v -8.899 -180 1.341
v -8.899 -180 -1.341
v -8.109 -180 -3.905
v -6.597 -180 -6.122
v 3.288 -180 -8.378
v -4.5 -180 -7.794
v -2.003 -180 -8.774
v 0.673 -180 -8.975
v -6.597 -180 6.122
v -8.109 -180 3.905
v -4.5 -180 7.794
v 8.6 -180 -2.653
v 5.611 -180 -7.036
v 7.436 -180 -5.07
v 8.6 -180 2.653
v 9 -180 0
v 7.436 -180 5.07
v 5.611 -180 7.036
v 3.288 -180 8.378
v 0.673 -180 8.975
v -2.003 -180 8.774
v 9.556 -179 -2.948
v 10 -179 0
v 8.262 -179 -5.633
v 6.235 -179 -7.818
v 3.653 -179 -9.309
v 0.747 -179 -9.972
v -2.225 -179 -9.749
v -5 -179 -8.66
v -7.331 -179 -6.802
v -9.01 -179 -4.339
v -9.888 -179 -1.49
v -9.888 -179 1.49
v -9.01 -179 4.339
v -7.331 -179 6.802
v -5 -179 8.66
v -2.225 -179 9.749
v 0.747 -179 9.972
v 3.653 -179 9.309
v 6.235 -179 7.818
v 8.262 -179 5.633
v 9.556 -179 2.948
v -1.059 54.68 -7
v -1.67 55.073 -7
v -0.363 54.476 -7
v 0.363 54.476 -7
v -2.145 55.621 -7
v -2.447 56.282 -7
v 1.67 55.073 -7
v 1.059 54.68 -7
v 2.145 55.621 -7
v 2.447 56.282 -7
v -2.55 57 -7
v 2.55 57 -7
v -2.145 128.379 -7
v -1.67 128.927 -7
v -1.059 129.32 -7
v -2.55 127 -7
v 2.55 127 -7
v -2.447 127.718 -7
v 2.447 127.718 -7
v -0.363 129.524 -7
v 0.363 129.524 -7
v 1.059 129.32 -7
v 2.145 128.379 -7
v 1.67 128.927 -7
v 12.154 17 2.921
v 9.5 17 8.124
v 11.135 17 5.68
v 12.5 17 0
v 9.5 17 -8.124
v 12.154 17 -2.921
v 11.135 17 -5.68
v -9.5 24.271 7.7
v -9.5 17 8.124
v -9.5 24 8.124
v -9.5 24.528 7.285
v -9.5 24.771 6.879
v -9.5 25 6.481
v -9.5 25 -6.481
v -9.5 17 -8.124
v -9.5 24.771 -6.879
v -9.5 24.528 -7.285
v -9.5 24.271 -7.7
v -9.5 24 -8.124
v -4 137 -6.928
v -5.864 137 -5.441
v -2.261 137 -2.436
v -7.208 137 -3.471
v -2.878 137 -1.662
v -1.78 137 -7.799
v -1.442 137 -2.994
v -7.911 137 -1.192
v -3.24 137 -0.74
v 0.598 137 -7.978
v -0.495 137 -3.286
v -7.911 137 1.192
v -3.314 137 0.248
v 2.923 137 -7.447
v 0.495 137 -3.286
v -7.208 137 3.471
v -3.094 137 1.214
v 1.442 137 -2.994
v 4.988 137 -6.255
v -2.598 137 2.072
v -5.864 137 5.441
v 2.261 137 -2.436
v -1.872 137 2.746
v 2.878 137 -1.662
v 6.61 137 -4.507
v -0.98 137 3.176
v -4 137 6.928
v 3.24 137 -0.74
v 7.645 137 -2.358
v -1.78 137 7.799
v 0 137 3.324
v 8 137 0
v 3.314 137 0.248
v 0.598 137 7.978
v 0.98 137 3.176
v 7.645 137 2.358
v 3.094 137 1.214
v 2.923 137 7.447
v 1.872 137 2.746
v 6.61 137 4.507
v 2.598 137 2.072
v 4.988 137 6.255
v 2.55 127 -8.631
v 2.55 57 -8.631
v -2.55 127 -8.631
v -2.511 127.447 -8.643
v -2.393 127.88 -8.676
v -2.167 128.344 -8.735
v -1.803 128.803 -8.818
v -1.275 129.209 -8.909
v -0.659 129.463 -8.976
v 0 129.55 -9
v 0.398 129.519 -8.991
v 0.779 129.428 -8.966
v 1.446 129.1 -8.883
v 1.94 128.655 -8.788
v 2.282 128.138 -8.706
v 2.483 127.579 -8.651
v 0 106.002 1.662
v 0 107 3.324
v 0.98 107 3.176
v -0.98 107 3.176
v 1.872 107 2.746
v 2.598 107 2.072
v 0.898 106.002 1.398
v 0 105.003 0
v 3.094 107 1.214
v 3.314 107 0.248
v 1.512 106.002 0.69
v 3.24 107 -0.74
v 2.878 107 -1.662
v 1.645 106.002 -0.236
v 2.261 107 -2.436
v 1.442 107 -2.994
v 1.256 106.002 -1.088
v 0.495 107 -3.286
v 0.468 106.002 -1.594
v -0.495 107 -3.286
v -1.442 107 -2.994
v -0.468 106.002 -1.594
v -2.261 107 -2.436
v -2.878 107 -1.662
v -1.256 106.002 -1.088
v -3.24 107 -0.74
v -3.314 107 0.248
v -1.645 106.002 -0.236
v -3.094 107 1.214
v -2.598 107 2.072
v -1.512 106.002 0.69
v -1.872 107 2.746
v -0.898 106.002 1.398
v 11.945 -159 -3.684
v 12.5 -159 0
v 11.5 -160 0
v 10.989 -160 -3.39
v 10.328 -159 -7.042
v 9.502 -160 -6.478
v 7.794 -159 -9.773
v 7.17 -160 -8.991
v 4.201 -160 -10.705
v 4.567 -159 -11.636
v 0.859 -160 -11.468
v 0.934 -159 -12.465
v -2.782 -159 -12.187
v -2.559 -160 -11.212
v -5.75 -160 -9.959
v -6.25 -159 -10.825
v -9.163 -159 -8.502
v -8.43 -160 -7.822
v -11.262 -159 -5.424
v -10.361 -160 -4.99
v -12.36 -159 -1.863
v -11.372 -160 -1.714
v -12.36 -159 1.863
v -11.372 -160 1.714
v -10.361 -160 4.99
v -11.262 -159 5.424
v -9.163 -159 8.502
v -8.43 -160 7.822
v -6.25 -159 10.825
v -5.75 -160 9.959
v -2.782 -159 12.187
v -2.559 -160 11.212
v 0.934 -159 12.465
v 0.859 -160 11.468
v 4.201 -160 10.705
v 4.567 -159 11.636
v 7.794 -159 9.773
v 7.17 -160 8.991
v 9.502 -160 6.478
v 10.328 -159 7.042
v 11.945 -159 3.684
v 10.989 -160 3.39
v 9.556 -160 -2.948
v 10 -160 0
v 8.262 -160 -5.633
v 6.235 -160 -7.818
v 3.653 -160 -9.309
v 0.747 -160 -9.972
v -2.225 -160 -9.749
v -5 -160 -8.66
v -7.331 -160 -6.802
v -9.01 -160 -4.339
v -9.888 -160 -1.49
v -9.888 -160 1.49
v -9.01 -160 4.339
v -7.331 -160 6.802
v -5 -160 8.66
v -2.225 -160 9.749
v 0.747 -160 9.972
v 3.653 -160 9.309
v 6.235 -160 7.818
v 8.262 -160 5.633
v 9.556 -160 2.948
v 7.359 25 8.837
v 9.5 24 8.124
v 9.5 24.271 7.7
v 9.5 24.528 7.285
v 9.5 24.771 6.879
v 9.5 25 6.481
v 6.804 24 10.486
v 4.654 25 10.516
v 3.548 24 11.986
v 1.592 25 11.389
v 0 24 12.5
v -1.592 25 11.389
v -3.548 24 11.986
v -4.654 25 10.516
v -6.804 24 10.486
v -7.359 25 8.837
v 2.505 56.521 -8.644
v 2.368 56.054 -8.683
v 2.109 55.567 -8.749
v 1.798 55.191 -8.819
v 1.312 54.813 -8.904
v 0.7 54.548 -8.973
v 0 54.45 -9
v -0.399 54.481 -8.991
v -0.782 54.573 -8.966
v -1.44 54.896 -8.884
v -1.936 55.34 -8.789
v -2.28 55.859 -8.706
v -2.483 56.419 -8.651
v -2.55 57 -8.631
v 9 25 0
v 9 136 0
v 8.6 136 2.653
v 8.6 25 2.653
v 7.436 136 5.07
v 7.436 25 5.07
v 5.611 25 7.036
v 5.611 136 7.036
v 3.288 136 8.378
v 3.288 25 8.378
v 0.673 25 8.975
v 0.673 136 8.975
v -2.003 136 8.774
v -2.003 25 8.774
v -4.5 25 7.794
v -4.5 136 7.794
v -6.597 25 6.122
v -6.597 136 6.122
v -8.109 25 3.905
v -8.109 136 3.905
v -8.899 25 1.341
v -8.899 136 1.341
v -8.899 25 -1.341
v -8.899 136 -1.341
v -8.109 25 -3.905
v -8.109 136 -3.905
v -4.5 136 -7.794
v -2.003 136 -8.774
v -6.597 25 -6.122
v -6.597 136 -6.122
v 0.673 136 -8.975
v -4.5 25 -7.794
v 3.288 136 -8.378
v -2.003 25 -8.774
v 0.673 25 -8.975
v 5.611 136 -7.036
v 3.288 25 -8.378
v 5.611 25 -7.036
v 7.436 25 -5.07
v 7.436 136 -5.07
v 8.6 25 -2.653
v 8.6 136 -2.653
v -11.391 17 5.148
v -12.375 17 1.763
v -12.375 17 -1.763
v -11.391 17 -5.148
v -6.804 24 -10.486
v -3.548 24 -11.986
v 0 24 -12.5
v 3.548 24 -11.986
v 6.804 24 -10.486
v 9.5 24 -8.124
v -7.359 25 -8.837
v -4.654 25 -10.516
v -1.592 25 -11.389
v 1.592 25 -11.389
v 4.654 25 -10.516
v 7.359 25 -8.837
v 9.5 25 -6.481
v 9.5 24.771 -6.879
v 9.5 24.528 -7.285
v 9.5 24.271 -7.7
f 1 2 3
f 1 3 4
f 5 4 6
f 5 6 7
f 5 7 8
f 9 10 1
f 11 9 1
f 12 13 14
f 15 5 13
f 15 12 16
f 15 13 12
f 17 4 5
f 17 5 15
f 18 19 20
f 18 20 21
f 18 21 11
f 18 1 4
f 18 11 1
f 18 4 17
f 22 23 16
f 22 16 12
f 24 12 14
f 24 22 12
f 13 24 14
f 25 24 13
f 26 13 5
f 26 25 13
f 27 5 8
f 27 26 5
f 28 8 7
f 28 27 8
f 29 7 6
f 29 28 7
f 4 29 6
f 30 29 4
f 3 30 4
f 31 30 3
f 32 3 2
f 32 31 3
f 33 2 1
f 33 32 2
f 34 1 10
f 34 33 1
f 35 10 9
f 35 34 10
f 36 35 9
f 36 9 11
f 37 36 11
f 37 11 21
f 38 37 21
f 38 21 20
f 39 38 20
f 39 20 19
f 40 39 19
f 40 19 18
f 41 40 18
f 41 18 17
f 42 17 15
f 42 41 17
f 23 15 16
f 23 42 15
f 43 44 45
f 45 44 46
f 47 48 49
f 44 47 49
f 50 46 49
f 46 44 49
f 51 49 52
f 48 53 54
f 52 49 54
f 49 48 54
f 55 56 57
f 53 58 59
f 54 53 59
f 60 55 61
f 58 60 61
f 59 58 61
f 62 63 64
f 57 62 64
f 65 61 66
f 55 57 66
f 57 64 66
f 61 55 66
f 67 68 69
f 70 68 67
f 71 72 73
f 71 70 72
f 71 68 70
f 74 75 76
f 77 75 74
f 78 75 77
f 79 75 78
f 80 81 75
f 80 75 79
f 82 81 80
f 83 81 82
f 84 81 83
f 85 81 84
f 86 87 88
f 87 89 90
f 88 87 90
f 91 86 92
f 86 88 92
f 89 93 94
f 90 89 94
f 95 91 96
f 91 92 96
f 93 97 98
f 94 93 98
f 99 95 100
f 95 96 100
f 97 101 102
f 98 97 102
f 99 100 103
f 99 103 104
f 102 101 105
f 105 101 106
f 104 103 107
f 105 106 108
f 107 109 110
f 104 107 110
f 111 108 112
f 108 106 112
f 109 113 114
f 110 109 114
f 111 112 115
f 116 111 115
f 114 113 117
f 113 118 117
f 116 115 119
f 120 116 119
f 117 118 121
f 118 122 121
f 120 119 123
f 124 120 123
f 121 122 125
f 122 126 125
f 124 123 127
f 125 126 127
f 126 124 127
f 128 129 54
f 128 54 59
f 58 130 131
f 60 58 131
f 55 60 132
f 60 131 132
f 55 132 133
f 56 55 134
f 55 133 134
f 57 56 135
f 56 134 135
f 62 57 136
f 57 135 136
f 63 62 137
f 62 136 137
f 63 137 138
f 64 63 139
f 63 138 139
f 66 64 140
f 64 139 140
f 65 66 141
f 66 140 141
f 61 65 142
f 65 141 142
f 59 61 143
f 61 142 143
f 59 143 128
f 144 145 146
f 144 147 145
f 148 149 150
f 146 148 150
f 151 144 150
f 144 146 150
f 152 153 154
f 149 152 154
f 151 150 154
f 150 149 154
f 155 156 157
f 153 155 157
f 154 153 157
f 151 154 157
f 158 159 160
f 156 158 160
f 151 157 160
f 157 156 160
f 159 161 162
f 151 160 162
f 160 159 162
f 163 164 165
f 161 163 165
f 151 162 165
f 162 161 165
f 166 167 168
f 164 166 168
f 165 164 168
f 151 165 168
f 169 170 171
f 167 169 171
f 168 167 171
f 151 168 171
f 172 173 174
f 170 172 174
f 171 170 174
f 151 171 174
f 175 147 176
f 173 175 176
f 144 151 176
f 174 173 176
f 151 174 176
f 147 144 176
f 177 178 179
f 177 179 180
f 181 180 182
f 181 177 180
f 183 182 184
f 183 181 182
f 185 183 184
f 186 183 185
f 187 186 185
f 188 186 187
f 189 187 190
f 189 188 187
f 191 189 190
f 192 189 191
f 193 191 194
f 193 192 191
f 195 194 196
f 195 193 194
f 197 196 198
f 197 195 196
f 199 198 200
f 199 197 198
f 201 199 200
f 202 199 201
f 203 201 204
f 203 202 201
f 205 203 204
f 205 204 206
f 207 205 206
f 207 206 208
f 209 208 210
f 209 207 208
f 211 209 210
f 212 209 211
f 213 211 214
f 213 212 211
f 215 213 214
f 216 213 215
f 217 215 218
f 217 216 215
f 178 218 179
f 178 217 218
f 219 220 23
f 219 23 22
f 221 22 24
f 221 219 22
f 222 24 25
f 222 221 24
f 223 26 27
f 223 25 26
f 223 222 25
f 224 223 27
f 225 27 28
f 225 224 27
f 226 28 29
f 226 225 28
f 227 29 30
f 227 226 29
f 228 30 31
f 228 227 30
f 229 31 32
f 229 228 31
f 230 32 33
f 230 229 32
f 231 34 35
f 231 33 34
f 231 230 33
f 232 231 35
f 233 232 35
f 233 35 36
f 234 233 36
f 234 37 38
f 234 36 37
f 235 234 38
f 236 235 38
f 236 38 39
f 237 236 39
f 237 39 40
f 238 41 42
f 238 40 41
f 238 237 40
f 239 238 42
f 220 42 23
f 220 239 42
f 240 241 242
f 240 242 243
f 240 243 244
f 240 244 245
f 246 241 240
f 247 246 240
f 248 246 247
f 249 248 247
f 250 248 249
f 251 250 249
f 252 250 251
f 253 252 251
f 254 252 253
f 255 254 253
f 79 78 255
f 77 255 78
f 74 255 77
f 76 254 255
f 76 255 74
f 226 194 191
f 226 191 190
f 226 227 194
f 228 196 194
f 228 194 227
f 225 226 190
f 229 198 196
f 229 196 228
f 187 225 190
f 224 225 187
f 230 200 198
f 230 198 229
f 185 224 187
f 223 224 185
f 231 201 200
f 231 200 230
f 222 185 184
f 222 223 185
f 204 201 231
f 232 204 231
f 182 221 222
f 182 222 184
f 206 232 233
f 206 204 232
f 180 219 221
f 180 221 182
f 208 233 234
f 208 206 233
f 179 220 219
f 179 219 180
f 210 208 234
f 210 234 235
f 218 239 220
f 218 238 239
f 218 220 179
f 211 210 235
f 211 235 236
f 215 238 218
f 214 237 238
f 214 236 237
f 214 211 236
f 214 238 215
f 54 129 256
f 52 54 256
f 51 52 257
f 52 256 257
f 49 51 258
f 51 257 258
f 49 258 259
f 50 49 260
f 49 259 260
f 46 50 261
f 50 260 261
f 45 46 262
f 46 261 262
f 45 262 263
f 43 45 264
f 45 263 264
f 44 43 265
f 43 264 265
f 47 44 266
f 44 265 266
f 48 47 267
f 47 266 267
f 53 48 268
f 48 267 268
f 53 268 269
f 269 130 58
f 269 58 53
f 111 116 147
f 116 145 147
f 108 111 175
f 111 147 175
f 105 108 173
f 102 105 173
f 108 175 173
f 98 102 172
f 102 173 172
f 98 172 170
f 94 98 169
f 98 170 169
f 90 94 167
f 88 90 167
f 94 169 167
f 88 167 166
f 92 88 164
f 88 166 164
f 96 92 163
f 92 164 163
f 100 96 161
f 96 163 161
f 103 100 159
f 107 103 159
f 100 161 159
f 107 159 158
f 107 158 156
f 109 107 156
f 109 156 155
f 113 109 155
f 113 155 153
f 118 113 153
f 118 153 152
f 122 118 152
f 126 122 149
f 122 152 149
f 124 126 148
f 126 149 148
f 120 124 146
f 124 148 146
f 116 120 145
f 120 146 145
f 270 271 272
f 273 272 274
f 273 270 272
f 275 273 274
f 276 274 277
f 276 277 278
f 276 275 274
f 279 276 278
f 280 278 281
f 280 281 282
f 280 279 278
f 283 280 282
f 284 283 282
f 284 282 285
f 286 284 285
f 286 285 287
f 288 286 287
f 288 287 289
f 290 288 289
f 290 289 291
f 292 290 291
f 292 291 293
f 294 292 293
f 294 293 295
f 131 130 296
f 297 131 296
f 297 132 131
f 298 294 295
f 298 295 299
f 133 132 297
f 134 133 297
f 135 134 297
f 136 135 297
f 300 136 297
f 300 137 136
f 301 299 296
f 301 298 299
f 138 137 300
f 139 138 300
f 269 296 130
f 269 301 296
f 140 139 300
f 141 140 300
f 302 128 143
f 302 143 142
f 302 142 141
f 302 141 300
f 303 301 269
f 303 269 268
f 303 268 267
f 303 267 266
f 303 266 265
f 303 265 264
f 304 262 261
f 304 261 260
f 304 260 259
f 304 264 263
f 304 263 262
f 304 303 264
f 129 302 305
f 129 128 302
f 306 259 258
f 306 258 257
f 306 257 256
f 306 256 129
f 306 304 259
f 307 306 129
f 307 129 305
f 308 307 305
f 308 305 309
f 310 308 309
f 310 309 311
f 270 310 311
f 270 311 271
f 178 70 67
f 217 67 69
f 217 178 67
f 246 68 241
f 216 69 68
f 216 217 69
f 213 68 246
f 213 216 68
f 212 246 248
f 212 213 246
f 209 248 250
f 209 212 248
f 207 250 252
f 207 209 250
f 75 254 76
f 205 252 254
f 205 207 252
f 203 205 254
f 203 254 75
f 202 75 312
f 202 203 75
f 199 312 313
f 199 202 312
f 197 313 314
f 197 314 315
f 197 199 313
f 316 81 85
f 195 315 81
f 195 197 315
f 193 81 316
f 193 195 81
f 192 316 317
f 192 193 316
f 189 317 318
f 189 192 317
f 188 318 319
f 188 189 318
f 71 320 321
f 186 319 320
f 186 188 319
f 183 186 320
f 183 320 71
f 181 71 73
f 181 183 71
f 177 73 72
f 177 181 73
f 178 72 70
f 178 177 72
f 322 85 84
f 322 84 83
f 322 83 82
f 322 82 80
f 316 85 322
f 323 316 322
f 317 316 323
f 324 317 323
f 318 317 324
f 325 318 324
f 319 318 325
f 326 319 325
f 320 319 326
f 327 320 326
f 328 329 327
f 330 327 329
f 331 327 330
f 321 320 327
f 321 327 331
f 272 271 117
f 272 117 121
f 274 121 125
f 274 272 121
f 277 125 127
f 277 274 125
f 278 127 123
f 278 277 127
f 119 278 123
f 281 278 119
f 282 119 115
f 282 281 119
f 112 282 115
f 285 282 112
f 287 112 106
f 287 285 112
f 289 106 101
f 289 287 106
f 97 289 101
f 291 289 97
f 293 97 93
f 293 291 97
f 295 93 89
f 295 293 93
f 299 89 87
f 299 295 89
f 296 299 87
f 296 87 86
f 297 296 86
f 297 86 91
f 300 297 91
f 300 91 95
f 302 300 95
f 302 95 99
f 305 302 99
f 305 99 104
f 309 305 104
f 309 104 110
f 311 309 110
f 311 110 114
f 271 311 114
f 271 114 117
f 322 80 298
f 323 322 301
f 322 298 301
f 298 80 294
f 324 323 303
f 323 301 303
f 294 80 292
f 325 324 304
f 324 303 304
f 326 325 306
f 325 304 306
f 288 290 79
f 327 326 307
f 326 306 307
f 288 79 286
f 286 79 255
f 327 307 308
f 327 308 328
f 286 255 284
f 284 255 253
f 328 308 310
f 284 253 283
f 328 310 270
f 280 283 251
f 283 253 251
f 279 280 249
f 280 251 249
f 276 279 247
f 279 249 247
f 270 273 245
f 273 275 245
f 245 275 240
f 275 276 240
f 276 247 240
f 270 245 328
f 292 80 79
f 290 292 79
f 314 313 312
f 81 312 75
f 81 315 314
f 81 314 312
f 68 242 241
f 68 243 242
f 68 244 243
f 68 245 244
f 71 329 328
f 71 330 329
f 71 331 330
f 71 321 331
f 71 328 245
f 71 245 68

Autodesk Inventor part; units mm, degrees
ref_plane "YZ Plane" through (0, 0, 0) normal (1, 0, 0) x (0, 1, 0)
ref_plane "XZ Plane" through (0, 0, 0) normal (0, 1, 0) x (-1, 0, 0)
sketch "Эскиз1" plane through (0, 0, 0) normal (0, 0, 1) x (1, 0, 0)
  line L0 (0, 137) -> (0, -200)
  line L1 (0, 137) -> (9, 137)
  line L2 (9, 137) -> (9, 25)
  line L3 (9, 25) -> (12.5, 25)
  line L4 (12.5, 25) -> (12.5, -180)
  line L5 (12.5, -180) -> (0, -180)
  line L6 (10, -180) -> (10, -160)
  line L7 (10, -160) -> (12.5, -160)
  point P0 (0, 0)
  point P1 (0, -177.0364)
  dimension "d1" = 200
  dimension "d2" = 18
  dimension "d3" = 25
  dimension "d7" = 25
  dimension "d8" = 137
  dimension "d16" = 180
  dimension "d17" = 20
  dimension "d18" = 20
revolve "Вращение1" add sketch "Эскиз1" angle 360 about axis through (0, 137, 0) along (0, -1, 0) contours L1 L2 L3 L4 L7 L6 L5 L0
sketch "Эскиз2" plane through (0, 137, 0) normal (0, 1, 0) x (1, 0, 0)
  point P0 (0, 0)
hole "Отверстие1" at (0, 137, 0) direction (0, -1, 0) diameter 6.647 depth 30 tip angle 118 thread size "M8x1.25" class "6H" standard "ISO Metric profile"
thread "Резьба1" size "M20x2.5" class "6g" standard "ISO Metric profile" full length
ref_plane "РабПлоскость1" through (0, 81, -9) normal (0, 0, 1) x (1, 0, 0)
sketch "Эскиз3" plane through (0, 81, -9) normal (0, 0, 1) x (1, 0, 0)
  line L0 (0, 46) -> (0, -24) construction
  line L1 (-2.55, 46) -> (-2.55, -24)
  line L2 (2.55, -24) -> (2.55, 46)
  arc A0 (2.55, 46) -> (-2.55, 46) centre (0, 46) ccw
  arc A1 (-2.55, -24) -> (2.55, -24) centre (0, -24) ccw
  line L3 (-9, 56) -> (9, 56) projected
  point P0 (0, -81)
  point P1 (0, 11)
  point P2 (0, 56)
  dimension "d21" = 10
  dimension "d22" = 70
  dimension "d23" = 5.1
extrude "Выдавливание1" cut sketch "Эскиз3" along normal blind 2
chamfer "Chamfer1" distance 1 angle 45 4 edges at (-9, 137, 0) (-12.5, 25, 0) (-12.5, -160, 0) (-10, -180, 0)
sketch "Sketch4" plane through (0, 0, 0) normal (0, 0, 1) x (1, 0, 0)
  line L0 (12.5, 24) -> (-12.5, 24) projected
  line L1 (-12.5, -159) -> (12.5, -159) projected
  line L2 (-11.5, 25) -> (11.5, 25) projected
  line L3 (12.5, 24) -> (-12.5, 24) projected
  line L4 (-11.5, 25) -> (11.5, 25) projected
  line L5 (9.5, 25) -> (9.5, 17)
  line L6 (9.5, 17) -> (12.5, 17)
  line L7 (-12.5, 17) -> (-9.5, 17)
  line L8 (-9.5, 17) -> (-9.5, 25)
  line L9 (-9, 25) -> (9, 25) projected
  line L10 (0, 25) -> (0, 9.8425) construction
  line L11 (12.5, 24) -> (-12.5, 24) projected
  line L12 (12.5, 24) -> (12.5, 17)
  line L13 (11.5, 25) -> (12.5, 24)
  line L14 (11.5, 25) -> (12.5, 24) projected
  line L15 (-11.5, 25) -> (-12.5, 24)
  line L16 (-11.5, 25) -> (-12.5, 24) projected
  line L17 (-12.5, 17) -> (-12.5, 24)
  line L18 (-12.5, 24) -> (-12.5, -159) projected
  point P0 (0, 0)
  dimension "d29" = 19
  dimension "d30" = 8
extrude "Extrusion2" cut sketch "Sketch4" along normal through all both and the other way through all contours L12 L6 L5 L0 | L0 L5 L2 L13 | L8 L7 L17 L0 | L0 L15 L2 L8
properties part number "Вал"
